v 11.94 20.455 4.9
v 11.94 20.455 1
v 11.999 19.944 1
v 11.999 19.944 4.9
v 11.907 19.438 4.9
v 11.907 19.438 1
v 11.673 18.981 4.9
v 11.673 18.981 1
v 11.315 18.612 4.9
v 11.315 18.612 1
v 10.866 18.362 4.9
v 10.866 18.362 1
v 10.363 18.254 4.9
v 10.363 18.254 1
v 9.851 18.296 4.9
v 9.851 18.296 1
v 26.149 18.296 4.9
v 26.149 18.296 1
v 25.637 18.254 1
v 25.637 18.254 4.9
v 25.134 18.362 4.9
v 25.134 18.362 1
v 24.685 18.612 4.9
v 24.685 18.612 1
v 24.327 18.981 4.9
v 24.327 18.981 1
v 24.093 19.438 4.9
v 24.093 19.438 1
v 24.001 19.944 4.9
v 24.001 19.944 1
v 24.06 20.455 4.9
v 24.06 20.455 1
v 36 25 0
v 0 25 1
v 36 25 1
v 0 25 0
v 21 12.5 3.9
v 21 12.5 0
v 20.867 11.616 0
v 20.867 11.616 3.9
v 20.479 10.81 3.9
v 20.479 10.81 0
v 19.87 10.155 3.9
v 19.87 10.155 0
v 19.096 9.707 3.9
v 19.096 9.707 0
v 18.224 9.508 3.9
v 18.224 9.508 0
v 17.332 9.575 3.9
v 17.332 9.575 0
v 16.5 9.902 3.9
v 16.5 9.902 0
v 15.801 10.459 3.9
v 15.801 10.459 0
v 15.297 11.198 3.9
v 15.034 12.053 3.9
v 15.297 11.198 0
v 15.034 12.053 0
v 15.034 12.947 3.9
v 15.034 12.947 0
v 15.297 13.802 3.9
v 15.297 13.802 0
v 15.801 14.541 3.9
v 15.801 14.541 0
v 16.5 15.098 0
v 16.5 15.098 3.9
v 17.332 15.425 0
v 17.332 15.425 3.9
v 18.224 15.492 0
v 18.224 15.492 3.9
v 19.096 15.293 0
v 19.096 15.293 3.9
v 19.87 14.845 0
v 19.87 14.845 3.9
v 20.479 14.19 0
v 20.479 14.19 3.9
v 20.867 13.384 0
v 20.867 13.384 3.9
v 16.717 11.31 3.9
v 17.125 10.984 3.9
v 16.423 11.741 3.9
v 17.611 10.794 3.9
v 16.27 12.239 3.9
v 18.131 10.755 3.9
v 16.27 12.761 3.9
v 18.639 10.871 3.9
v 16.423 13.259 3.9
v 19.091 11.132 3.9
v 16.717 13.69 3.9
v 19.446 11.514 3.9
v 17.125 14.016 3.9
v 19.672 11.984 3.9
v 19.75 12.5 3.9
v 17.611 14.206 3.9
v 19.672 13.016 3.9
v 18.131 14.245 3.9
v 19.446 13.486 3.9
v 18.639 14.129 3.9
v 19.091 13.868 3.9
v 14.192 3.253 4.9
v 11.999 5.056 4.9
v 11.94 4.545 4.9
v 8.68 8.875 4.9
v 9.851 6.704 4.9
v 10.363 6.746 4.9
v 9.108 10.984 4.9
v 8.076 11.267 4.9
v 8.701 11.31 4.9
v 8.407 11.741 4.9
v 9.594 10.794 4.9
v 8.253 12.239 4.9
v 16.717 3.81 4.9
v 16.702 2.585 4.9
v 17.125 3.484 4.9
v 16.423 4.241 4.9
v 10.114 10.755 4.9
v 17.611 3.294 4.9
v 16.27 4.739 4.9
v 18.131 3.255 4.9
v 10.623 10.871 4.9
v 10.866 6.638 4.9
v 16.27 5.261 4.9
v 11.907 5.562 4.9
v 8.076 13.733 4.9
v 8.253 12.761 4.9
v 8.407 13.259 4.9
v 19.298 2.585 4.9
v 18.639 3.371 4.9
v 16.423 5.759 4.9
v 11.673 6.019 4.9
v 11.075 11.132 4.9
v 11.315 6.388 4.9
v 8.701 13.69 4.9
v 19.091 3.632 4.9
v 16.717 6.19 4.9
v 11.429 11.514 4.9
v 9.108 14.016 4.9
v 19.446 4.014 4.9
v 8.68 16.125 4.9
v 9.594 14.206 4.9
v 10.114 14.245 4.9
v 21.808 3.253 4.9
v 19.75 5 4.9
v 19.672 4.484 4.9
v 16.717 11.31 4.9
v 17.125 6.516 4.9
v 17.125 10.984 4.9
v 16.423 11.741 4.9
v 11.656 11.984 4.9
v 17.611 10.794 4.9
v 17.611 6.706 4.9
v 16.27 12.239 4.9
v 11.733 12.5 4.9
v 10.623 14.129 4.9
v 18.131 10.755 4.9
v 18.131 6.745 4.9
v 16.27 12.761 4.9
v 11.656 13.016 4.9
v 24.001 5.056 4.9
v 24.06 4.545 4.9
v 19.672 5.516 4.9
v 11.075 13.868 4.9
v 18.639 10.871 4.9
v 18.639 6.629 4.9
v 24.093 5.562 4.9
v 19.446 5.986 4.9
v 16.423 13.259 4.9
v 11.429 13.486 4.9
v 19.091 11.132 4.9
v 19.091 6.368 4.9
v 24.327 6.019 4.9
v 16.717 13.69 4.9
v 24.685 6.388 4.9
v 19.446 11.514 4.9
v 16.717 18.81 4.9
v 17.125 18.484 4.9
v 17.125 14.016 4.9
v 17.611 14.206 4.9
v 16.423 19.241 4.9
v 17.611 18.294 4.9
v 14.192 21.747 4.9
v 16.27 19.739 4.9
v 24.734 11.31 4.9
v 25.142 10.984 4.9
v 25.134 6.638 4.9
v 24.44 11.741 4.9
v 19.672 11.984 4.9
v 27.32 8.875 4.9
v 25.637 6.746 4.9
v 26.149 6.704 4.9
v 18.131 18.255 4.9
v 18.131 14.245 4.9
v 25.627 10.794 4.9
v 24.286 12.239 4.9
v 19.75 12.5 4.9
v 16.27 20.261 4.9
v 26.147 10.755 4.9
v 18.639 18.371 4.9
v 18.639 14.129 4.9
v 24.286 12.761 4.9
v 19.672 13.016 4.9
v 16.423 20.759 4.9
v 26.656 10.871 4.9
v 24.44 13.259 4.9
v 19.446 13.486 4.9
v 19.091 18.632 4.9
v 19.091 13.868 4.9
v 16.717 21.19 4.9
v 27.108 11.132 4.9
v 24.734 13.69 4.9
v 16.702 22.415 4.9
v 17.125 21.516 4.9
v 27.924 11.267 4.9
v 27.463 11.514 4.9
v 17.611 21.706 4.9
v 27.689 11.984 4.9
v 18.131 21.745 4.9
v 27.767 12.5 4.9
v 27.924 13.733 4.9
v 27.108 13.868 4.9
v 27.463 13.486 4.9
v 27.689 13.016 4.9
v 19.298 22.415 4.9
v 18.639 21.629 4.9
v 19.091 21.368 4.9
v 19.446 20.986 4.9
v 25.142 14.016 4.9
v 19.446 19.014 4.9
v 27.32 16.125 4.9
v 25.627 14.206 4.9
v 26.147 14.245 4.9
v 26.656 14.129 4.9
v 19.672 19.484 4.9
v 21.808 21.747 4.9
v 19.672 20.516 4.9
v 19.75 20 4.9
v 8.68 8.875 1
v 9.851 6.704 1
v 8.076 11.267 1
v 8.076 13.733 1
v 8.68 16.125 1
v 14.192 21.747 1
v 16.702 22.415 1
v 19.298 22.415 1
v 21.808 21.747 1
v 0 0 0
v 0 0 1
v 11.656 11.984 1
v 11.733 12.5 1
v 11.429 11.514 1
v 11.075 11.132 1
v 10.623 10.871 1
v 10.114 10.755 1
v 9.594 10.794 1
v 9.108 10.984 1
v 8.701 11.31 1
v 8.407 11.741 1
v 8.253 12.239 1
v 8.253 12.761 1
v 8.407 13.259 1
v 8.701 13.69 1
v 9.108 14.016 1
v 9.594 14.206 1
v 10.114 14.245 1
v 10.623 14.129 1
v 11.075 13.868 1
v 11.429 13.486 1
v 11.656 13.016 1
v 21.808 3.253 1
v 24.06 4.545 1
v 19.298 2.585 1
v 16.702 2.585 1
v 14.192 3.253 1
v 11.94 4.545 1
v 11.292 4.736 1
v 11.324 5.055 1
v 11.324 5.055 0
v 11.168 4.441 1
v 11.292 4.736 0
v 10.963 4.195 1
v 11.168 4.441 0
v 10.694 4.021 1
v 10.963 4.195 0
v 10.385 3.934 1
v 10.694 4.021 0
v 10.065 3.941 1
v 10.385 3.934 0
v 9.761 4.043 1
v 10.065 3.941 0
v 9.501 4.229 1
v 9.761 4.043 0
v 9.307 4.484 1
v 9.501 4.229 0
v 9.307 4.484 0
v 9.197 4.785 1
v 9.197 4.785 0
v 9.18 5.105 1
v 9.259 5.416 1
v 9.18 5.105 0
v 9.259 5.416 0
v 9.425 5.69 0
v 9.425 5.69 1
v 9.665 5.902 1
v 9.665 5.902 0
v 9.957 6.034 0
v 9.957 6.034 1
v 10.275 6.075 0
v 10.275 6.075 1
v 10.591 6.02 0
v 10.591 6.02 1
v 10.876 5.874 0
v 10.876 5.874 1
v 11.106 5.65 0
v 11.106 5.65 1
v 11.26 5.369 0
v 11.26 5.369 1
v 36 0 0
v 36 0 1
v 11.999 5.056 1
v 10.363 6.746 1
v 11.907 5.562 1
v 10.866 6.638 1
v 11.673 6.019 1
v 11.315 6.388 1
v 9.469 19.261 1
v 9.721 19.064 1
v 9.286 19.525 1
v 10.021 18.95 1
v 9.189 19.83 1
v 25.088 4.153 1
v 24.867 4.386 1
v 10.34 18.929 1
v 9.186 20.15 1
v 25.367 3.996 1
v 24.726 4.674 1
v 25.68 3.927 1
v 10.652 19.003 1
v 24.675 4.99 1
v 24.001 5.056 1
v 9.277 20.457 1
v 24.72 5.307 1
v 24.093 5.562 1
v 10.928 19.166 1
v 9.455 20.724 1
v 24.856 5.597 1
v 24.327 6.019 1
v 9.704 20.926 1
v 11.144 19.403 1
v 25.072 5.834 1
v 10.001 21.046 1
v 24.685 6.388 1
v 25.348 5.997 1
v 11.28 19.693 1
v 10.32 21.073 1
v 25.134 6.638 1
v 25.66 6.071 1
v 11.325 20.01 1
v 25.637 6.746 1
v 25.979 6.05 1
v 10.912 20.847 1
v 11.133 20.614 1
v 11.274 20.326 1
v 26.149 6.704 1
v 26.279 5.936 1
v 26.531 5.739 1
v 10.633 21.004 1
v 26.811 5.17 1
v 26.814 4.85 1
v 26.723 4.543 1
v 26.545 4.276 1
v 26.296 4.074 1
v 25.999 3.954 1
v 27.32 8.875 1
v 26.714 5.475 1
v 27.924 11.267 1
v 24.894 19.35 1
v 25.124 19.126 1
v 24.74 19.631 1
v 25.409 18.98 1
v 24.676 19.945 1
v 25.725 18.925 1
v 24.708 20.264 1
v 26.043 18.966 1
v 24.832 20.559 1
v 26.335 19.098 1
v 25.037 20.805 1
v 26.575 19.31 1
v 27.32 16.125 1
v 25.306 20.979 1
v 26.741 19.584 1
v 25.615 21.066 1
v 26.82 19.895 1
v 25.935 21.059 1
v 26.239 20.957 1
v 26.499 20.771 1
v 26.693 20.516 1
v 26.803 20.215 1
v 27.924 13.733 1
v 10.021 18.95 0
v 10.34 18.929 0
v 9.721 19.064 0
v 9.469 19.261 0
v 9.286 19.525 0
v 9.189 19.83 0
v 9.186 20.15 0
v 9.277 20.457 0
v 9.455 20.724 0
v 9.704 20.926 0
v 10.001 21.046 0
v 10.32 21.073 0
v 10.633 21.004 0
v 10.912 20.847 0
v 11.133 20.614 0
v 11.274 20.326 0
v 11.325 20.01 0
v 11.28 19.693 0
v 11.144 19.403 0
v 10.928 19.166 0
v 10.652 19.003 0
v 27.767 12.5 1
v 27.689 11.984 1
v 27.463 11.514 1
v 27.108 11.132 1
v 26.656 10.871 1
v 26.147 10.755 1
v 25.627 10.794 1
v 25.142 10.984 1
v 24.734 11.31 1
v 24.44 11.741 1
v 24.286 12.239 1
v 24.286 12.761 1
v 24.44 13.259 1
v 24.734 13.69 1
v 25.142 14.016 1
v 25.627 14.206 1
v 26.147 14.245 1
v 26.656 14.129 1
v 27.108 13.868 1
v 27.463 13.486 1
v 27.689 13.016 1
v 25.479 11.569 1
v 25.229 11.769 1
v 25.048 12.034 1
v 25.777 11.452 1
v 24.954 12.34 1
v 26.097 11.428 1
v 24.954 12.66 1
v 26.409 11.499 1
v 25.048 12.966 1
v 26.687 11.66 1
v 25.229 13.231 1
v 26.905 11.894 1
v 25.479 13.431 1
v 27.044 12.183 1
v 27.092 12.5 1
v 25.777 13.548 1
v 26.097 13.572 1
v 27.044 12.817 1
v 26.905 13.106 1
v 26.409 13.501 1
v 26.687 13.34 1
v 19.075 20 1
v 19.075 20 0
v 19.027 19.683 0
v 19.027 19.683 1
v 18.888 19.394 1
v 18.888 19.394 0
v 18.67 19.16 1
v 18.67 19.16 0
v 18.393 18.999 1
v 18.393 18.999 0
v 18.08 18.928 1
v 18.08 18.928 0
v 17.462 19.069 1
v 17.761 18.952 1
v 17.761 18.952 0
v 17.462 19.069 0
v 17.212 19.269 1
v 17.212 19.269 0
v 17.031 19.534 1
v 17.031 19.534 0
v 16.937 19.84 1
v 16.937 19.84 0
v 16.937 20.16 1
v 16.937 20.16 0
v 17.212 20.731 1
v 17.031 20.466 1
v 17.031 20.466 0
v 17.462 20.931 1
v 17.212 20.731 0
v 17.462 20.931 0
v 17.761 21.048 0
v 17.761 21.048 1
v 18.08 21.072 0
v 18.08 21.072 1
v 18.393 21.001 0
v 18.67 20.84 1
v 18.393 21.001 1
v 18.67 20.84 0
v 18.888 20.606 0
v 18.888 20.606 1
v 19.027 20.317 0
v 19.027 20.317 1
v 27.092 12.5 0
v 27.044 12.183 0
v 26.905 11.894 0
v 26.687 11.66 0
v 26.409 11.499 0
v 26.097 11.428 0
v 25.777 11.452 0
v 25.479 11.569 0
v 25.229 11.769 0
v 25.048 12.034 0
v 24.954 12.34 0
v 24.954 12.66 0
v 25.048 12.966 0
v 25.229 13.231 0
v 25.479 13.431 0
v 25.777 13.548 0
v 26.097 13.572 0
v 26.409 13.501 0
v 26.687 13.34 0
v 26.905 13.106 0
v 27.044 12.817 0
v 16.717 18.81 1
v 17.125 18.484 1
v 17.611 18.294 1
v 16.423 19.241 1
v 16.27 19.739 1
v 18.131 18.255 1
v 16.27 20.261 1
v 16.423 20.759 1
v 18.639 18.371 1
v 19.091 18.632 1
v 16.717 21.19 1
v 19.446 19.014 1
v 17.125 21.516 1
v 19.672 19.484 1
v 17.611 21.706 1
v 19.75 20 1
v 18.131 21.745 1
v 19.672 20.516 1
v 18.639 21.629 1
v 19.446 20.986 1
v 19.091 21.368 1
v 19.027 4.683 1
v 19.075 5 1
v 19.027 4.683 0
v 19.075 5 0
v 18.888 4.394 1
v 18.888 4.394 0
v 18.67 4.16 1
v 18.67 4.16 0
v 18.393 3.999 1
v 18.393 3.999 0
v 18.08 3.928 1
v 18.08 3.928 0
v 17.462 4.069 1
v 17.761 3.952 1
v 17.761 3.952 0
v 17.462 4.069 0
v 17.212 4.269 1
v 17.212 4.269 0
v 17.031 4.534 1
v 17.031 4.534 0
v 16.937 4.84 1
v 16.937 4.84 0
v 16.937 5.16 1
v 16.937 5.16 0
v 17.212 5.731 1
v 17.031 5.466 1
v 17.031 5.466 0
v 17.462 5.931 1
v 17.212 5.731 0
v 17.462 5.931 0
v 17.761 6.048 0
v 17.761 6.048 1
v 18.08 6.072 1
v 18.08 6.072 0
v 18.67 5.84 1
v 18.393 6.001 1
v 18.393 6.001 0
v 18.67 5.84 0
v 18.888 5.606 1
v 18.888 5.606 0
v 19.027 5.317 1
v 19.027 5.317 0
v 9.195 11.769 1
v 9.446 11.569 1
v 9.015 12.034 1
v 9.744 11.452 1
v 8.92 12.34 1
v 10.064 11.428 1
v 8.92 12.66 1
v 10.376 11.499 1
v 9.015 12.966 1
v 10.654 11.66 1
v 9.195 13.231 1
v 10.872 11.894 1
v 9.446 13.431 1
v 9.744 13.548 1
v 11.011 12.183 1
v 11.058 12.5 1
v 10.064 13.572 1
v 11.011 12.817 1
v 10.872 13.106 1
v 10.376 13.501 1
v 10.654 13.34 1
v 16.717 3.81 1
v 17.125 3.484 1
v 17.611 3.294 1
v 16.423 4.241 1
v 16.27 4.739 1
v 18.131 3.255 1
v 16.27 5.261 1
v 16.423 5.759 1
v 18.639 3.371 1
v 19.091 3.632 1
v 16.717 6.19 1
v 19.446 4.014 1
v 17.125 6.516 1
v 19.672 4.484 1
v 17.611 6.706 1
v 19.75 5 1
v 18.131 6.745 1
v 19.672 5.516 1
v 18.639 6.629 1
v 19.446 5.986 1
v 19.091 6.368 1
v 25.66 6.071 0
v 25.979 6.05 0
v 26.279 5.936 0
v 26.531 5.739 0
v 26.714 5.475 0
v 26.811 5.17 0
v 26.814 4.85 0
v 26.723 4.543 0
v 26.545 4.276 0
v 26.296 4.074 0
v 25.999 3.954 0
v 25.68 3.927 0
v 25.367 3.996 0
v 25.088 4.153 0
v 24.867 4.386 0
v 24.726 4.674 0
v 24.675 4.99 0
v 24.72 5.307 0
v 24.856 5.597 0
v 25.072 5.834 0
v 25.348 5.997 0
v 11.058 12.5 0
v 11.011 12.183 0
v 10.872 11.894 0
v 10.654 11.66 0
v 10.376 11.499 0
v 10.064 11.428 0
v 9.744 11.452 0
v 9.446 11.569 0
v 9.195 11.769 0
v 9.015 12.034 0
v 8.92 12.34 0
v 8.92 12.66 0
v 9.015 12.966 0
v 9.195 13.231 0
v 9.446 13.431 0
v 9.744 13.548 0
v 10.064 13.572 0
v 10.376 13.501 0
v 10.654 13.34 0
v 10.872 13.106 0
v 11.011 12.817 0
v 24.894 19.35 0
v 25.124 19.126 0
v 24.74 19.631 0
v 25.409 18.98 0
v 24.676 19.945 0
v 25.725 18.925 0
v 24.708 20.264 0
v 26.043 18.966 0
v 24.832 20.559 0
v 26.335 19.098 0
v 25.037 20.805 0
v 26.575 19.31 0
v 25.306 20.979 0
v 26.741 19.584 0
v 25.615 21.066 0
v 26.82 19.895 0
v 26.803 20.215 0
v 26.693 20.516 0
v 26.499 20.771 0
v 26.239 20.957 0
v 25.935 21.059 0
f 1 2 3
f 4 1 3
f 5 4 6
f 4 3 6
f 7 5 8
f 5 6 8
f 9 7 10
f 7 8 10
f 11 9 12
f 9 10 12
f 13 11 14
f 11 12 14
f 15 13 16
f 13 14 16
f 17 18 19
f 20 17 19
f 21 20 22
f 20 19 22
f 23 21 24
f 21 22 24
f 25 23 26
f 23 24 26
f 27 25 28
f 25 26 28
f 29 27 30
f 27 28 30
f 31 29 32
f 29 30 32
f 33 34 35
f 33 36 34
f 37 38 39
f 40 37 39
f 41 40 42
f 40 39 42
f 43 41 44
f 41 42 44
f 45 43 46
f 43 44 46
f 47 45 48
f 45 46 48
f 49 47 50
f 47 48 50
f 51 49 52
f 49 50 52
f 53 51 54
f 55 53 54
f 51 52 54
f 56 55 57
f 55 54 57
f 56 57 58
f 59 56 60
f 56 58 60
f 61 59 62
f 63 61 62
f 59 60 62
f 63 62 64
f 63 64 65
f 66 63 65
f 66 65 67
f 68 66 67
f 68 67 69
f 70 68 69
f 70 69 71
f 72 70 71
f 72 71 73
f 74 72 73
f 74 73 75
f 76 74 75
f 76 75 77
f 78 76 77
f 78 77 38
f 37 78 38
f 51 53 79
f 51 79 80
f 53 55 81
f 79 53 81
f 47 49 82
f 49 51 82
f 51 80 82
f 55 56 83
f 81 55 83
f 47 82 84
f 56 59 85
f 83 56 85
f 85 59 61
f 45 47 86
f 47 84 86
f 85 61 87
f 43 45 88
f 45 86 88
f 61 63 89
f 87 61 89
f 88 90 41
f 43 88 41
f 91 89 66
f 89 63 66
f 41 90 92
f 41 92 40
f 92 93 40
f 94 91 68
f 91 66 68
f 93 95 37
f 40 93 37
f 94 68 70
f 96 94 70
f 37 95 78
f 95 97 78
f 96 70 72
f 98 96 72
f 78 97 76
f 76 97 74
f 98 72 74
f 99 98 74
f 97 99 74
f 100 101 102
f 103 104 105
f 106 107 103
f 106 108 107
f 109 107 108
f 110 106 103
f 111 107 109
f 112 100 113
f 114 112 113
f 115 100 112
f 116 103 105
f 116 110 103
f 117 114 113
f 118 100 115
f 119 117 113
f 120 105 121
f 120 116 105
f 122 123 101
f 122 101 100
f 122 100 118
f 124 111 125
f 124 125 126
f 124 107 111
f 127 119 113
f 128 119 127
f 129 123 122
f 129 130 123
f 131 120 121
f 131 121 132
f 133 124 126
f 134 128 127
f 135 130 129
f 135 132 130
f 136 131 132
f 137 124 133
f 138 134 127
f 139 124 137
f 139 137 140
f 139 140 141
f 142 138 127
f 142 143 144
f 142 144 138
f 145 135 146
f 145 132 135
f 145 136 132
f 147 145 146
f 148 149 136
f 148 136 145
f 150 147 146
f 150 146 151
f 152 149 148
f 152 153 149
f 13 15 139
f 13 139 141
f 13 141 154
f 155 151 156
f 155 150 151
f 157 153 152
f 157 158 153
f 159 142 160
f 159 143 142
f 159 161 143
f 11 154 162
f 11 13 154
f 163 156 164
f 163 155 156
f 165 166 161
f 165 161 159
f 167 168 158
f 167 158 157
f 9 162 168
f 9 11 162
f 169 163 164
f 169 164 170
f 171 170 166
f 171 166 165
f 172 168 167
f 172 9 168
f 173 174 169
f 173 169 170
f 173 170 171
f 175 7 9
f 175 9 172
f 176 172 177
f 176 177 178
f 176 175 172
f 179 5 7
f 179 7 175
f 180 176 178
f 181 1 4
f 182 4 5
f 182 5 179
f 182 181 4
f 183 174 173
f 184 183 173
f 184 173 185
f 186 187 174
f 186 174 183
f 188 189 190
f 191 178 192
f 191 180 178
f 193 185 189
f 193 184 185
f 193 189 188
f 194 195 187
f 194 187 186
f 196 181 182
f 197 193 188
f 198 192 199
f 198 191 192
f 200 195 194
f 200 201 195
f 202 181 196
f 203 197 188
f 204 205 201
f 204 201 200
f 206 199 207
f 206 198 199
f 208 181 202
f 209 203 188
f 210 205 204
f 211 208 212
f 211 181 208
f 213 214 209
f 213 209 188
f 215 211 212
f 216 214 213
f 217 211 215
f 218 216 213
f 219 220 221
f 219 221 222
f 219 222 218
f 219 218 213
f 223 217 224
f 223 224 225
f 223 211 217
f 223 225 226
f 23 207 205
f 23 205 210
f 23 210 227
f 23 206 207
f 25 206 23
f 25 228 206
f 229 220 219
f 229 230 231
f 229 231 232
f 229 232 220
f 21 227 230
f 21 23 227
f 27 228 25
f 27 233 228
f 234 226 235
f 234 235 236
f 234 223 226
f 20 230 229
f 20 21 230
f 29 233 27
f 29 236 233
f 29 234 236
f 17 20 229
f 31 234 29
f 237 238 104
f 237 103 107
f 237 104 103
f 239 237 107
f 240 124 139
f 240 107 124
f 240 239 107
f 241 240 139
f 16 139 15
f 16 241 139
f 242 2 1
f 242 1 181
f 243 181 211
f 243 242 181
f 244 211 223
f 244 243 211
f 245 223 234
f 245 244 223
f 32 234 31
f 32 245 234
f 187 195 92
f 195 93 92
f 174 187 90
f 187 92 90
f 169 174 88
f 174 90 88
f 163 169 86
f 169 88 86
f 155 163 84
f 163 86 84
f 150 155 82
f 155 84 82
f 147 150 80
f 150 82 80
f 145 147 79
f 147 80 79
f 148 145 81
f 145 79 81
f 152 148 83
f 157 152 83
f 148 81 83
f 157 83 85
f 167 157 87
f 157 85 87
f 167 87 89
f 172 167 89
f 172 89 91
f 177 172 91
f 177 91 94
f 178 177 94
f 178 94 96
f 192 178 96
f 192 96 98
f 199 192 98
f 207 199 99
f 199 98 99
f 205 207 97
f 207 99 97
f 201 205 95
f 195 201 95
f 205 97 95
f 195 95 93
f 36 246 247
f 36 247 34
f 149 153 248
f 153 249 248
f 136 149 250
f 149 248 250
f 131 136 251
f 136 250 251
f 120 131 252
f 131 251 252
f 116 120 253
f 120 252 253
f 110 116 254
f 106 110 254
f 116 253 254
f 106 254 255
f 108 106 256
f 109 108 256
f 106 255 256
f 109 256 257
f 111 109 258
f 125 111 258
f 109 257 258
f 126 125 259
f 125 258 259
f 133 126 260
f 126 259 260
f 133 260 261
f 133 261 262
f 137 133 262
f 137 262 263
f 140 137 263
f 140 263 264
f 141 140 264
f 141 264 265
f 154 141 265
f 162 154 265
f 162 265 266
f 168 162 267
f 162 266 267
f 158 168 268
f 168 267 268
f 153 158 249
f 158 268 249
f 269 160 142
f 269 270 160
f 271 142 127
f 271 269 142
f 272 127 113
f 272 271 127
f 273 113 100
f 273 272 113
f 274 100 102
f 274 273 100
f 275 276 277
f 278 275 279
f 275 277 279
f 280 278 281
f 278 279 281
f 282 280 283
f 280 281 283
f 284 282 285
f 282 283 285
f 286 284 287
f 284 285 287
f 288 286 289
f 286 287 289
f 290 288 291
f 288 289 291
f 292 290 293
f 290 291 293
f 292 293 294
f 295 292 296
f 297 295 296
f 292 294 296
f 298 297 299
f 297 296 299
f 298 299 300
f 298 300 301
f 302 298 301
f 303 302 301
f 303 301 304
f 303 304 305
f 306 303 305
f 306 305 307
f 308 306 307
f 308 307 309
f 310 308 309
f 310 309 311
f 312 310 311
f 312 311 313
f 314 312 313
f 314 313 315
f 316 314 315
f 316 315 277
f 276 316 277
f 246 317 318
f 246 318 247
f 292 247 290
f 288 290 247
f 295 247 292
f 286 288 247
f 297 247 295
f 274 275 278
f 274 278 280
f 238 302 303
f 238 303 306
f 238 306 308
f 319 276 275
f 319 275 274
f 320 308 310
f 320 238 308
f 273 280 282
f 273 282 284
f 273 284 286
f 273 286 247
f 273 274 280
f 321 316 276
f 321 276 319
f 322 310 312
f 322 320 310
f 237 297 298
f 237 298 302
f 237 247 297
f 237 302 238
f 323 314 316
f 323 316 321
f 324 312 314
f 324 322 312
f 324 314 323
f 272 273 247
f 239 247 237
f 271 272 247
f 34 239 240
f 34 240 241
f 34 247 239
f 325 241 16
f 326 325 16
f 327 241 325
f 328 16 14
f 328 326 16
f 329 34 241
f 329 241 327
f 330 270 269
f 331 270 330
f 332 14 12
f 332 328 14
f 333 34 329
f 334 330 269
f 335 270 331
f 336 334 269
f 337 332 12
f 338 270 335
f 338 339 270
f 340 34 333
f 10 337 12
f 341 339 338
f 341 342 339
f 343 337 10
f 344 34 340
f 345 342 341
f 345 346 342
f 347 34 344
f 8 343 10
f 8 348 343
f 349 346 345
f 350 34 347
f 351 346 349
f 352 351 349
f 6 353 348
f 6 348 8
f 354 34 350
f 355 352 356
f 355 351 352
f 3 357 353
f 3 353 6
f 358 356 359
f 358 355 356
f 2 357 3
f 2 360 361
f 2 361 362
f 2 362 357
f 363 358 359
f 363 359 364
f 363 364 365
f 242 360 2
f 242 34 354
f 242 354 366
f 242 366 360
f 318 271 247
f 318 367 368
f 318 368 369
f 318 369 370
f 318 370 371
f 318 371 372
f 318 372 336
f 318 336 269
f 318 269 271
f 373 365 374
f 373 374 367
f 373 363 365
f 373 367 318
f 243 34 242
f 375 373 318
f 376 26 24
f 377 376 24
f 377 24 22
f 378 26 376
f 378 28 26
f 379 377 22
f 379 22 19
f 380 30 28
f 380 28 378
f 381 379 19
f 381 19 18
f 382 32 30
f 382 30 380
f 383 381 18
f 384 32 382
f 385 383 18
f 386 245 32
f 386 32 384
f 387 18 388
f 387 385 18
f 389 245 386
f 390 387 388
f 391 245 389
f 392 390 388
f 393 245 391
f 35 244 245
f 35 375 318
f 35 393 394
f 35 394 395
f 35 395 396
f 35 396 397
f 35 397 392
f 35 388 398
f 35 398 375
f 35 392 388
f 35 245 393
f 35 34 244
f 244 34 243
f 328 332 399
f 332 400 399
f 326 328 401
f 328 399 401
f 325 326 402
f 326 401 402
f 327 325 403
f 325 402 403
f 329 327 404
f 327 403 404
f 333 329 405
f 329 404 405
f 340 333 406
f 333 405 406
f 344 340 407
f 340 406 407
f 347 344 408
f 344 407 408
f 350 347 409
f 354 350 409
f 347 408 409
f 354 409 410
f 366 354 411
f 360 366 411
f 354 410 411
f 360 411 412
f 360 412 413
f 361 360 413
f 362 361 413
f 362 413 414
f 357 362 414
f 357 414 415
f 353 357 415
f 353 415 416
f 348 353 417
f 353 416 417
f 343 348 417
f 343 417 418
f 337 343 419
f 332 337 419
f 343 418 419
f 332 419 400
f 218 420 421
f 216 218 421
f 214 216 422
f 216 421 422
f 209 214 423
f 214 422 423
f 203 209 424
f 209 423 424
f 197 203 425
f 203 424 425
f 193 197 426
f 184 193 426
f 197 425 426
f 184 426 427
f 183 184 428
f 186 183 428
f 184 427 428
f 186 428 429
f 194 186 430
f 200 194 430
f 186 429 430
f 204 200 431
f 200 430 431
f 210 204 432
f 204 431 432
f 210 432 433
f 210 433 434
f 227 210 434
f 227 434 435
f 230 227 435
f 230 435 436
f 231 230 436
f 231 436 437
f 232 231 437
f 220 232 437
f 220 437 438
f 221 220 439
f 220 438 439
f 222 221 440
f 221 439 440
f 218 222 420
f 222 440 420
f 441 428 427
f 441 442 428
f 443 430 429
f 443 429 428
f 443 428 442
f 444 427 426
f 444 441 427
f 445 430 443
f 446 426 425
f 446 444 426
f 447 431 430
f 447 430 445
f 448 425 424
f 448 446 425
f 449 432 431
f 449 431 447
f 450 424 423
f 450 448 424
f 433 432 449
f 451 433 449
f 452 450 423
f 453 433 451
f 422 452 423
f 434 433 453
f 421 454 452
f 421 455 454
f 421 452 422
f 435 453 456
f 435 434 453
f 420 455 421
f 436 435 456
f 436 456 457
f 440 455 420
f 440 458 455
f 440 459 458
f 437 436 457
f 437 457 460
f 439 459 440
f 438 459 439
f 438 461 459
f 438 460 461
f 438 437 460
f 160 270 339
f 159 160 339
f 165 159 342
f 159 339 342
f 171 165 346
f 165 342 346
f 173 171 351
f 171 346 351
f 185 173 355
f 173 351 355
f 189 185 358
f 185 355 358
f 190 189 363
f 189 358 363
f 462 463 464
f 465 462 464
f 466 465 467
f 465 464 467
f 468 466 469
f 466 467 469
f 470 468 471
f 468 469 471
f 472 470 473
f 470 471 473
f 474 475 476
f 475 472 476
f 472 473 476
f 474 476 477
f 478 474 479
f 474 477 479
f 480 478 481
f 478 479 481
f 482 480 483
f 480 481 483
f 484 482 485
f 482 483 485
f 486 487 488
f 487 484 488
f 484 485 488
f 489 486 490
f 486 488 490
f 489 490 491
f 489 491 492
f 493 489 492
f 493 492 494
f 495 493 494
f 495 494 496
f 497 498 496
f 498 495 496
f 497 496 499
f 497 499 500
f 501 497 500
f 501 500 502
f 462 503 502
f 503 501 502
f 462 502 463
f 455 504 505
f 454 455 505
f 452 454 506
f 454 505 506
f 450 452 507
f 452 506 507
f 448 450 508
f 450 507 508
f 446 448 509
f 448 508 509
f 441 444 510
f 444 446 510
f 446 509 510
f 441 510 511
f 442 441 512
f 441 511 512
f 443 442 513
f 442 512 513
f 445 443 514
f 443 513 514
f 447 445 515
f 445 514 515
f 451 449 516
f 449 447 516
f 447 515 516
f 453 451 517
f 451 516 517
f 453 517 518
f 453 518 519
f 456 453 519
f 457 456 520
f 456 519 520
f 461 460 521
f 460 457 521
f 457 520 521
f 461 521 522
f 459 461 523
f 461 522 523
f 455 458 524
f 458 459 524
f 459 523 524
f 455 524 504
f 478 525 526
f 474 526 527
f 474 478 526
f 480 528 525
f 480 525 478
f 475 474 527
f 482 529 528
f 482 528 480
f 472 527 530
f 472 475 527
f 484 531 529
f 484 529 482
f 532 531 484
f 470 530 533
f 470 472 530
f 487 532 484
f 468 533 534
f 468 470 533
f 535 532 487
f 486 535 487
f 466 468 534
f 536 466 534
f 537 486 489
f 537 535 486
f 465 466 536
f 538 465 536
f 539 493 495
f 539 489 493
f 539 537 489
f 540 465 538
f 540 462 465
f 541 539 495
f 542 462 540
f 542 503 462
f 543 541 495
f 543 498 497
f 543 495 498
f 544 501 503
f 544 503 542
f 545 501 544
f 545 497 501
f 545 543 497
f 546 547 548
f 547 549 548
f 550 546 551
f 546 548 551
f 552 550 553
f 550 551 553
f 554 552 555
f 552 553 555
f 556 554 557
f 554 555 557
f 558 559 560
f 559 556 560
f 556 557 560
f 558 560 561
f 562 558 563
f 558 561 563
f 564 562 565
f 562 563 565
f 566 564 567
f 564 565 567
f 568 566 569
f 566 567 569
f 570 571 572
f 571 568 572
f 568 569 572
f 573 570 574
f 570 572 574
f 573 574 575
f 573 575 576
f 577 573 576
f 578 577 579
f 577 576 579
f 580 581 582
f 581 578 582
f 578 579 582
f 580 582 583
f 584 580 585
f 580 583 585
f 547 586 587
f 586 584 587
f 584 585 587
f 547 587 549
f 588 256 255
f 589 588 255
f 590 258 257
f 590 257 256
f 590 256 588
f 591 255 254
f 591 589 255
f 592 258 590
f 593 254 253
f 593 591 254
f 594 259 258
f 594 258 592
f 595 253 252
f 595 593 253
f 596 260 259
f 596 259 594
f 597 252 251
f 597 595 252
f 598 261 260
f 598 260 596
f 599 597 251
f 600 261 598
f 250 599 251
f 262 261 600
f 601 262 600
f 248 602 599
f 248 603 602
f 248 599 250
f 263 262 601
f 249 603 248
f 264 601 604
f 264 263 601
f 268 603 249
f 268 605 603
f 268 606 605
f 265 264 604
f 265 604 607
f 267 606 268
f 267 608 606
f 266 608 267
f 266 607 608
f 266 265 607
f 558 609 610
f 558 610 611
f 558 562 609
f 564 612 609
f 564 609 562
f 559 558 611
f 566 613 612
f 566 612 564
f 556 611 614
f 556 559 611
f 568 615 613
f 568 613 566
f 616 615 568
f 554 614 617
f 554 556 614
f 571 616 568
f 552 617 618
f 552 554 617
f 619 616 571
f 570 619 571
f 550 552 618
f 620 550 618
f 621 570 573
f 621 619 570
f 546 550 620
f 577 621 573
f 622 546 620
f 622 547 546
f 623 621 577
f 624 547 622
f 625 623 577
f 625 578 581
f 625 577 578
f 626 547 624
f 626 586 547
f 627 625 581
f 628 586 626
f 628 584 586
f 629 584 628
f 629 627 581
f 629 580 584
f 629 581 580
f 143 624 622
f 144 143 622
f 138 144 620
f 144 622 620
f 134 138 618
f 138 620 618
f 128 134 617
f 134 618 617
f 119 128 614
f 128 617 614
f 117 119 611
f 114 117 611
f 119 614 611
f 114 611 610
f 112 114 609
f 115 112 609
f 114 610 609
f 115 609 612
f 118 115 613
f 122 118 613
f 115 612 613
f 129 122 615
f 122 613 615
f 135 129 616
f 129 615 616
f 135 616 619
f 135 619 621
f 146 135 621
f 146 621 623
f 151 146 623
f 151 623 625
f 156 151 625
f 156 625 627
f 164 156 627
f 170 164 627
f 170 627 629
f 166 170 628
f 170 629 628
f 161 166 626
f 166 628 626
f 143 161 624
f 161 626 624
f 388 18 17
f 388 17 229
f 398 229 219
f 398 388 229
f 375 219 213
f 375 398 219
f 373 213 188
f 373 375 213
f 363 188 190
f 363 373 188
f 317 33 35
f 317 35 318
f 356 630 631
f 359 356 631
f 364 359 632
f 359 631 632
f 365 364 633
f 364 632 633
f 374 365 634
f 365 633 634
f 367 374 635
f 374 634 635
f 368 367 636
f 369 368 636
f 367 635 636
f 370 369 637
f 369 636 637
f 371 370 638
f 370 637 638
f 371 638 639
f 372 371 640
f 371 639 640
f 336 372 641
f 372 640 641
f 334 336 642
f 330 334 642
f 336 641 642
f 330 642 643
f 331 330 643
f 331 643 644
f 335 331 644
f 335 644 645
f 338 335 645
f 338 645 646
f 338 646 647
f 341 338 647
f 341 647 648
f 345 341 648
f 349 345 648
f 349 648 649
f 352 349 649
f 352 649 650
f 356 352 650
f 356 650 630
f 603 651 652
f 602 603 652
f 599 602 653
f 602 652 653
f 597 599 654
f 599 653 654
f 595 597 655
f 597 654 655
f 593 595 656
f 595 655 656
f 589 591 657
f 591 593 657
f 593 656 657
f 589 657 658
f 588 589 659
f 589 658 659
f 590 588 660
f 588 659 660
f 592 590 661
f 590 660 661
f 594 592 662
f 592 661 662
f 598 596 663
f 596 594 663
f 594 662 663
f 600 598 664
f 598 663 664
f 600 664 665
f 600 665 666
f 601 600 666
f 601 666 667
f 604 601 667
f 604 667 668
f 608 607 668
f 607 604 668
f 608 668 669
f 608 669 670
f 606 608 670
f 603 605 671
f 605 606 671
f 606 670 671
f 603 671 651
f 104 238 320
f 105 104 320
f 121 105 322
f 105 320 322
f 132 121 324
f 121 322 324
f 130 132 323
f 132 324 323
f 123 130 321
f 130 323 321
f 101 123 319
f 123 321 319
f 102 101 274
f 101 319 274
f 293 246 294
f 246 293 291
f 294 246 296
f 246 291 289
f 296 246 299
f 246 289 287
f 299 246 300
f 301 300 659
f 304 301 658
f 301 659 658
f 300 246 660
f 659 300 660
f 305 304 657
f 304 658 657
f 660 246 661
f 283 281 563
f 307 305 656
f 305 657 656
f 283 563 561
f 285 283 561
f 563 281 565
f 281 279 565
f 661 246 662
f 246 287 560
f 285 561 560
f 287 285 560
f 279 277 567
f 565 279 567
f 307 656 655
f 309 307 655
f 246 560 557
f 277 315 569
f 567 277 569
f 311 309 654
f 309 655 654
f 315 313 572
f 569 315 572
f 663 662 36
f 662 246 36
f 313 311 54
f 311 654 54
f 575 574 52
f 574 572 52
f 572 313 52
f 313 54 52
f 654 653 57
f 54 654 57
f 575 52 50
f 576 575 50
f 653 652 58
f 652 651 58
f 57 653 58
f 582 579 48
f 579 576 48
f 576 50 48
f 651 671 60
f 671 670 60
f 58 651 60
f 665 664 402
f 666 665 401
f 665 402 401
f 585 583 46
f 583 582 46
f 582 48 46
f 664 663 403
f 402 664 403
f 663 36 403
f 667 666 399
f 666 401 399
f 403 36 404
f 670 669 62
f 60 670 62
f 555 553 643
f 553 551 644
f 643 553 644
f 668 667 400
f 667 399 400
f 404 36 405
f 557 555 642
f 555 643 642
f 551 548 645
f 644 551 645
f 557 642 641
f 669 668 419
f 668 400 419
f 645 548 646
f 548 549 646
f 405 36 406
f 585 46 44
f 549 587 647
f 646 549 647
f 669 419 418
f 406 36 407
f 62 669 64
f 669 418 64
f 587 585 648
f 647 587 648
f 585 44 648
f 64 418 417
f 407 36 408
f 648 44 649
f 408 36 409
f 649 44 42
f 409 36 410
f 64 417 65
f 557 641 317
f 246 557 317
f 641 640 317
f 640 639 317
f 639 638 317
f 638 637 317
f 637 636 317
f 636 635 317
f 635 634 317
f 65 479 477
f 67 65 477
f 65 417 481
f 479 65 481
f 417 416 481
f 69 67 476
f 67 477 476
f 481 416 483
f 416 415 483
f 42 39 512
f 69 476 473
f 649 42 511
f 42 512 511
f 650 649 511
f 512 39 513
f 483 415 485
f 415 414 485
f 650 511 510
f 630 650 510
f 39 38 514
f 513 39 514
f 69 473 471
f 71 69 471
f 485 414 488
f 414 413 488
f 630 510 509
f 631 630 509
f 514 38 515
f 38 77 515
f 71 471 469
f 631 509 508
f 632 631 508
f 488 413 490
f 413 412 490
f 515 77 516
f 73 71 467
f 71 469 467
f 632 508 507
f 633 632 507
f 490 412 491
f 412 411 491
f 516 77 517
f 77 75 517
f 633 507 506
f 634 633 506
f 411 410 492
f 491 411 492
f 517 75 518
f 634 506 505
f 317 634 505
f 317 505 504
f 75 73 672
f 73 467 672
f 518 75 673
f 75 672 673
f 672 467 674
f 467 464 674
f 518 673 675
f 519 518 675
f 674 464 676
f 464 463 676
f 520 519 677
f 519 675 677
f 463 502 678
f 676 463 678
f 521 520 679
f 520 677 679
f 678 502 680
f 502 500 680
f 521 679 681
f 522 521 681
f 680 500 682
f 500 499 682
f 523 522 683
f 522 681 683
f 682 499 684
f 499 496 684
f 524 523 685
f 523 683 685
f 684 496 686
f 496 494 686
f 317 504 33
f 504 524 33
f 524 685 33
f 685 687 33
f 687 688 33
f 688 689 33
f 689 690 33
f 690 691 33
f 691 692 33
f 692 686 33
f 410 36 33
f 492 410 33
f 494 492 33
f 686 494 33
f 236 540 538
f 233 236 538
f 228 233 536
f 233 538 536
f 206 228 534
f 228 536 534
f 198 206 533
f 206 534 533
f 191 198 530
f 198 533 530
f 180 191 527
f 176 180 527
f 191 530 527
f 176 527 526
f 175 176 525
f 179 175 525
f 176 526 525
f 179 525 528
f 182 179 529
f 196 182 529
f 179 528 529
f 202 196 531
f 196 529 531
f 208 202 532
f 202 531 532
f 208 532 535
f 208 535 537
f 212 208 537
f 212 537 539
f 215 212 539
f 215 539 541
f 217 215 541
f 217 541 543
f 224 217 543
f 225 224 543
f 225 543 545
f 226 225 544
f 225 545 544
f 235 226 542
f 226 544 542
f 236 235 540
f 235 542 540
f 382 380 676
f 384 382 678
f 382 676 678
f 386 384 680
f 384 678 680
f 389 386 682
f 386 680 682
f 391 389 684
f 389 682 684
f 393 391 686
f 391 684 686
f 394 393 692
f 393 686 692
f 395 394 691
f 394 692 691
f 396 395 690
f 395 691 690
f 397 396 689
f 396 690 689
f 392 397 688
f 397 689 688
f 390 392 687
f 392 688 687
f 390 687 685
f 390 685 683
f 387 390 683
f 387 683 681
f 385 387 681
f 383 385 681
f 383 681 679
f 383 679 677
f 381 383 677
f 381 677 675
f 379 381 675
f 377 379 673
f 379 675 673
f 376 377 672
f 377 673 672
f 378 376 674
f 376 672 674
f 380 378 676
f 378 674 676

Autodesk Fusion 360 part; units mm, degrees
sketch "Esquisse1" plane through (0, 0, 0) normal (0, 0, 1) x (1, 0, 0)
  line L0 (0, 25) -> (36, 25)
  line L1 (36, 25) -> (36, 0)
  line L2 (36, 0) -> (0, 0)
  line L3 (0, 0) -> (0, 25)
  line L4 (18, -4.4176) -> (18, 55.8936)
  circle A0 centre (10.25, 20) radius 1.075
  circle A1 centre (18, 20) radius 1.075
  line L5 (-6.2165, 12.5) -> (42, 12.5)
  circle A2 centre (9.9834, 12.5) radius 1.075
  circle A3 centre (25.75, 20) radius 1.075
  circle A4 centre (18, 20) radius 1.075
  circle A5 centre (26.0166, 12.5) radius 1.075
  circle A6 centre (10.25, 5) radius 1.075
  circle A7 centre (18, 5) radius 1.075
  circle A8 centre (25.75, 5) radius 1.075
  circle A9 centre (18, 12.5) radius 10
  circle A10 centre (18, 12.5) radius 1.75
  circle A11 centre (25.75, 20) radius 1.75
  circle A12 centre (18, 20) radius 1.75
  circle A13 centre (26.0166, 12.5) radius 1.75
  circle A14 centre (25.75, 5) radius 1.75
  circle A15 centre (18, 5) radius 1.75
  circle A16 centre (26.0166, 12.5) radius 1.75
  circle A17 centre (10.25, 20) radius 1.75
  circle A18 centre (9.9834, 12.5) radius 1.75
  circle A19 centre (10.25, 5) radius 1.75
  circle A20 centre (18, 12.5) radius 3
  point P0 (18, 12.5)
  dimension "d1" = 36
  dimension "d2" = 25
  dimension "d3" = 12.5
  dimension "d4" = 18
  dimension "d5" = 2.15
  dimension "d6" = 2.15
  dimension "d7" = 7.75
  dimension "d10" = 2.15
  dimension "d11" = 7.5
  dimension "d12" = 5
  dimension "d13" = 5
  dimension "d16" = 20
  dimension "d21" = 3.5
  dimension "d26" = 3.5
  dimension "d27" = 3.5
  dimension "d28" = 3.5
  dimension "d32" = 6
extrude "Extrusion4" add sketch "Esquisse1" along normal blind 1 contours L0 L3 L4 L5 A9 A17 | L0 L1 L4 L5 A9 A11 | L2 L3 L4 L5 A9 A19 | L1 L2 L4 L5 A9 A14 | A3 A9 A11 | A0 A9 A17 | A6 A9 A19 | A8 A9 A14 picked at (24.3887, 20.4618) picked at (11.6014, 20.4841) picked at (11.6014, 4.5159) picked at (24.3887, 4.5382)
extrude "Extrusion5" add sketch "Esquisse1" along normal blind 4.9 contours L4 L5 A9 A11 A12 A13 A16 A20 | L4 L5 A9 A12 A17 A18 A20 | L4 L5 A9 A15 A18 A19 A20 | L4 A1 A4 A12 | L4 A1 A4 A12 | A3 A9 A11 | A0 A9 A17 | L5 A2 A18 | L5 A2 A18 | A6 A9 A19 | L4 L5 A9 A13 A14 A15 A16 A20 | L5 A5 A13 A16 | L5 A5 A13 A16 | A8 A9 A14 | L4 L5 A10 A20 | L4 L5 A10 A20 | L4 A7 A15 | L4 A7 A15 | L4 L5 A10 A20 | L4 L5 A10 A20 picked at (25.5724, 18.6548) picked at (10.4124, 18.6517) picked at (10.4124, 6.3483) picked at (24.3997, 5.1334)
extrude "Extrusion6" cut sketch "Esquisse1" along normal blind 5 from surface at 1 contours L4 A1 A4 A12 | L4 A1 A4 A12 | A3 A9 A11 | A3 A9 A11 | A0 A9 A17 | A0 A9 A17 | L5 A2 A18 | L5 A2 A18 | A6 A9 A19 | A6 A9 A19 | L5 A5 A13 A16 | L5 A5 A13 A16 | A8 A9 A14 | A8 A9 A14 | L4 A7 A15 | L4 A7 A15
extrude "Extrusion8" cut sketch "Esquisse1" along normal blind 3.9 contours L4 L5 A10 A20 | L4 L5 A10 A20 | L4 L5 A10 A20 | L4 L5 A10 A20
extrude "Extrusion7" [suppressed]
